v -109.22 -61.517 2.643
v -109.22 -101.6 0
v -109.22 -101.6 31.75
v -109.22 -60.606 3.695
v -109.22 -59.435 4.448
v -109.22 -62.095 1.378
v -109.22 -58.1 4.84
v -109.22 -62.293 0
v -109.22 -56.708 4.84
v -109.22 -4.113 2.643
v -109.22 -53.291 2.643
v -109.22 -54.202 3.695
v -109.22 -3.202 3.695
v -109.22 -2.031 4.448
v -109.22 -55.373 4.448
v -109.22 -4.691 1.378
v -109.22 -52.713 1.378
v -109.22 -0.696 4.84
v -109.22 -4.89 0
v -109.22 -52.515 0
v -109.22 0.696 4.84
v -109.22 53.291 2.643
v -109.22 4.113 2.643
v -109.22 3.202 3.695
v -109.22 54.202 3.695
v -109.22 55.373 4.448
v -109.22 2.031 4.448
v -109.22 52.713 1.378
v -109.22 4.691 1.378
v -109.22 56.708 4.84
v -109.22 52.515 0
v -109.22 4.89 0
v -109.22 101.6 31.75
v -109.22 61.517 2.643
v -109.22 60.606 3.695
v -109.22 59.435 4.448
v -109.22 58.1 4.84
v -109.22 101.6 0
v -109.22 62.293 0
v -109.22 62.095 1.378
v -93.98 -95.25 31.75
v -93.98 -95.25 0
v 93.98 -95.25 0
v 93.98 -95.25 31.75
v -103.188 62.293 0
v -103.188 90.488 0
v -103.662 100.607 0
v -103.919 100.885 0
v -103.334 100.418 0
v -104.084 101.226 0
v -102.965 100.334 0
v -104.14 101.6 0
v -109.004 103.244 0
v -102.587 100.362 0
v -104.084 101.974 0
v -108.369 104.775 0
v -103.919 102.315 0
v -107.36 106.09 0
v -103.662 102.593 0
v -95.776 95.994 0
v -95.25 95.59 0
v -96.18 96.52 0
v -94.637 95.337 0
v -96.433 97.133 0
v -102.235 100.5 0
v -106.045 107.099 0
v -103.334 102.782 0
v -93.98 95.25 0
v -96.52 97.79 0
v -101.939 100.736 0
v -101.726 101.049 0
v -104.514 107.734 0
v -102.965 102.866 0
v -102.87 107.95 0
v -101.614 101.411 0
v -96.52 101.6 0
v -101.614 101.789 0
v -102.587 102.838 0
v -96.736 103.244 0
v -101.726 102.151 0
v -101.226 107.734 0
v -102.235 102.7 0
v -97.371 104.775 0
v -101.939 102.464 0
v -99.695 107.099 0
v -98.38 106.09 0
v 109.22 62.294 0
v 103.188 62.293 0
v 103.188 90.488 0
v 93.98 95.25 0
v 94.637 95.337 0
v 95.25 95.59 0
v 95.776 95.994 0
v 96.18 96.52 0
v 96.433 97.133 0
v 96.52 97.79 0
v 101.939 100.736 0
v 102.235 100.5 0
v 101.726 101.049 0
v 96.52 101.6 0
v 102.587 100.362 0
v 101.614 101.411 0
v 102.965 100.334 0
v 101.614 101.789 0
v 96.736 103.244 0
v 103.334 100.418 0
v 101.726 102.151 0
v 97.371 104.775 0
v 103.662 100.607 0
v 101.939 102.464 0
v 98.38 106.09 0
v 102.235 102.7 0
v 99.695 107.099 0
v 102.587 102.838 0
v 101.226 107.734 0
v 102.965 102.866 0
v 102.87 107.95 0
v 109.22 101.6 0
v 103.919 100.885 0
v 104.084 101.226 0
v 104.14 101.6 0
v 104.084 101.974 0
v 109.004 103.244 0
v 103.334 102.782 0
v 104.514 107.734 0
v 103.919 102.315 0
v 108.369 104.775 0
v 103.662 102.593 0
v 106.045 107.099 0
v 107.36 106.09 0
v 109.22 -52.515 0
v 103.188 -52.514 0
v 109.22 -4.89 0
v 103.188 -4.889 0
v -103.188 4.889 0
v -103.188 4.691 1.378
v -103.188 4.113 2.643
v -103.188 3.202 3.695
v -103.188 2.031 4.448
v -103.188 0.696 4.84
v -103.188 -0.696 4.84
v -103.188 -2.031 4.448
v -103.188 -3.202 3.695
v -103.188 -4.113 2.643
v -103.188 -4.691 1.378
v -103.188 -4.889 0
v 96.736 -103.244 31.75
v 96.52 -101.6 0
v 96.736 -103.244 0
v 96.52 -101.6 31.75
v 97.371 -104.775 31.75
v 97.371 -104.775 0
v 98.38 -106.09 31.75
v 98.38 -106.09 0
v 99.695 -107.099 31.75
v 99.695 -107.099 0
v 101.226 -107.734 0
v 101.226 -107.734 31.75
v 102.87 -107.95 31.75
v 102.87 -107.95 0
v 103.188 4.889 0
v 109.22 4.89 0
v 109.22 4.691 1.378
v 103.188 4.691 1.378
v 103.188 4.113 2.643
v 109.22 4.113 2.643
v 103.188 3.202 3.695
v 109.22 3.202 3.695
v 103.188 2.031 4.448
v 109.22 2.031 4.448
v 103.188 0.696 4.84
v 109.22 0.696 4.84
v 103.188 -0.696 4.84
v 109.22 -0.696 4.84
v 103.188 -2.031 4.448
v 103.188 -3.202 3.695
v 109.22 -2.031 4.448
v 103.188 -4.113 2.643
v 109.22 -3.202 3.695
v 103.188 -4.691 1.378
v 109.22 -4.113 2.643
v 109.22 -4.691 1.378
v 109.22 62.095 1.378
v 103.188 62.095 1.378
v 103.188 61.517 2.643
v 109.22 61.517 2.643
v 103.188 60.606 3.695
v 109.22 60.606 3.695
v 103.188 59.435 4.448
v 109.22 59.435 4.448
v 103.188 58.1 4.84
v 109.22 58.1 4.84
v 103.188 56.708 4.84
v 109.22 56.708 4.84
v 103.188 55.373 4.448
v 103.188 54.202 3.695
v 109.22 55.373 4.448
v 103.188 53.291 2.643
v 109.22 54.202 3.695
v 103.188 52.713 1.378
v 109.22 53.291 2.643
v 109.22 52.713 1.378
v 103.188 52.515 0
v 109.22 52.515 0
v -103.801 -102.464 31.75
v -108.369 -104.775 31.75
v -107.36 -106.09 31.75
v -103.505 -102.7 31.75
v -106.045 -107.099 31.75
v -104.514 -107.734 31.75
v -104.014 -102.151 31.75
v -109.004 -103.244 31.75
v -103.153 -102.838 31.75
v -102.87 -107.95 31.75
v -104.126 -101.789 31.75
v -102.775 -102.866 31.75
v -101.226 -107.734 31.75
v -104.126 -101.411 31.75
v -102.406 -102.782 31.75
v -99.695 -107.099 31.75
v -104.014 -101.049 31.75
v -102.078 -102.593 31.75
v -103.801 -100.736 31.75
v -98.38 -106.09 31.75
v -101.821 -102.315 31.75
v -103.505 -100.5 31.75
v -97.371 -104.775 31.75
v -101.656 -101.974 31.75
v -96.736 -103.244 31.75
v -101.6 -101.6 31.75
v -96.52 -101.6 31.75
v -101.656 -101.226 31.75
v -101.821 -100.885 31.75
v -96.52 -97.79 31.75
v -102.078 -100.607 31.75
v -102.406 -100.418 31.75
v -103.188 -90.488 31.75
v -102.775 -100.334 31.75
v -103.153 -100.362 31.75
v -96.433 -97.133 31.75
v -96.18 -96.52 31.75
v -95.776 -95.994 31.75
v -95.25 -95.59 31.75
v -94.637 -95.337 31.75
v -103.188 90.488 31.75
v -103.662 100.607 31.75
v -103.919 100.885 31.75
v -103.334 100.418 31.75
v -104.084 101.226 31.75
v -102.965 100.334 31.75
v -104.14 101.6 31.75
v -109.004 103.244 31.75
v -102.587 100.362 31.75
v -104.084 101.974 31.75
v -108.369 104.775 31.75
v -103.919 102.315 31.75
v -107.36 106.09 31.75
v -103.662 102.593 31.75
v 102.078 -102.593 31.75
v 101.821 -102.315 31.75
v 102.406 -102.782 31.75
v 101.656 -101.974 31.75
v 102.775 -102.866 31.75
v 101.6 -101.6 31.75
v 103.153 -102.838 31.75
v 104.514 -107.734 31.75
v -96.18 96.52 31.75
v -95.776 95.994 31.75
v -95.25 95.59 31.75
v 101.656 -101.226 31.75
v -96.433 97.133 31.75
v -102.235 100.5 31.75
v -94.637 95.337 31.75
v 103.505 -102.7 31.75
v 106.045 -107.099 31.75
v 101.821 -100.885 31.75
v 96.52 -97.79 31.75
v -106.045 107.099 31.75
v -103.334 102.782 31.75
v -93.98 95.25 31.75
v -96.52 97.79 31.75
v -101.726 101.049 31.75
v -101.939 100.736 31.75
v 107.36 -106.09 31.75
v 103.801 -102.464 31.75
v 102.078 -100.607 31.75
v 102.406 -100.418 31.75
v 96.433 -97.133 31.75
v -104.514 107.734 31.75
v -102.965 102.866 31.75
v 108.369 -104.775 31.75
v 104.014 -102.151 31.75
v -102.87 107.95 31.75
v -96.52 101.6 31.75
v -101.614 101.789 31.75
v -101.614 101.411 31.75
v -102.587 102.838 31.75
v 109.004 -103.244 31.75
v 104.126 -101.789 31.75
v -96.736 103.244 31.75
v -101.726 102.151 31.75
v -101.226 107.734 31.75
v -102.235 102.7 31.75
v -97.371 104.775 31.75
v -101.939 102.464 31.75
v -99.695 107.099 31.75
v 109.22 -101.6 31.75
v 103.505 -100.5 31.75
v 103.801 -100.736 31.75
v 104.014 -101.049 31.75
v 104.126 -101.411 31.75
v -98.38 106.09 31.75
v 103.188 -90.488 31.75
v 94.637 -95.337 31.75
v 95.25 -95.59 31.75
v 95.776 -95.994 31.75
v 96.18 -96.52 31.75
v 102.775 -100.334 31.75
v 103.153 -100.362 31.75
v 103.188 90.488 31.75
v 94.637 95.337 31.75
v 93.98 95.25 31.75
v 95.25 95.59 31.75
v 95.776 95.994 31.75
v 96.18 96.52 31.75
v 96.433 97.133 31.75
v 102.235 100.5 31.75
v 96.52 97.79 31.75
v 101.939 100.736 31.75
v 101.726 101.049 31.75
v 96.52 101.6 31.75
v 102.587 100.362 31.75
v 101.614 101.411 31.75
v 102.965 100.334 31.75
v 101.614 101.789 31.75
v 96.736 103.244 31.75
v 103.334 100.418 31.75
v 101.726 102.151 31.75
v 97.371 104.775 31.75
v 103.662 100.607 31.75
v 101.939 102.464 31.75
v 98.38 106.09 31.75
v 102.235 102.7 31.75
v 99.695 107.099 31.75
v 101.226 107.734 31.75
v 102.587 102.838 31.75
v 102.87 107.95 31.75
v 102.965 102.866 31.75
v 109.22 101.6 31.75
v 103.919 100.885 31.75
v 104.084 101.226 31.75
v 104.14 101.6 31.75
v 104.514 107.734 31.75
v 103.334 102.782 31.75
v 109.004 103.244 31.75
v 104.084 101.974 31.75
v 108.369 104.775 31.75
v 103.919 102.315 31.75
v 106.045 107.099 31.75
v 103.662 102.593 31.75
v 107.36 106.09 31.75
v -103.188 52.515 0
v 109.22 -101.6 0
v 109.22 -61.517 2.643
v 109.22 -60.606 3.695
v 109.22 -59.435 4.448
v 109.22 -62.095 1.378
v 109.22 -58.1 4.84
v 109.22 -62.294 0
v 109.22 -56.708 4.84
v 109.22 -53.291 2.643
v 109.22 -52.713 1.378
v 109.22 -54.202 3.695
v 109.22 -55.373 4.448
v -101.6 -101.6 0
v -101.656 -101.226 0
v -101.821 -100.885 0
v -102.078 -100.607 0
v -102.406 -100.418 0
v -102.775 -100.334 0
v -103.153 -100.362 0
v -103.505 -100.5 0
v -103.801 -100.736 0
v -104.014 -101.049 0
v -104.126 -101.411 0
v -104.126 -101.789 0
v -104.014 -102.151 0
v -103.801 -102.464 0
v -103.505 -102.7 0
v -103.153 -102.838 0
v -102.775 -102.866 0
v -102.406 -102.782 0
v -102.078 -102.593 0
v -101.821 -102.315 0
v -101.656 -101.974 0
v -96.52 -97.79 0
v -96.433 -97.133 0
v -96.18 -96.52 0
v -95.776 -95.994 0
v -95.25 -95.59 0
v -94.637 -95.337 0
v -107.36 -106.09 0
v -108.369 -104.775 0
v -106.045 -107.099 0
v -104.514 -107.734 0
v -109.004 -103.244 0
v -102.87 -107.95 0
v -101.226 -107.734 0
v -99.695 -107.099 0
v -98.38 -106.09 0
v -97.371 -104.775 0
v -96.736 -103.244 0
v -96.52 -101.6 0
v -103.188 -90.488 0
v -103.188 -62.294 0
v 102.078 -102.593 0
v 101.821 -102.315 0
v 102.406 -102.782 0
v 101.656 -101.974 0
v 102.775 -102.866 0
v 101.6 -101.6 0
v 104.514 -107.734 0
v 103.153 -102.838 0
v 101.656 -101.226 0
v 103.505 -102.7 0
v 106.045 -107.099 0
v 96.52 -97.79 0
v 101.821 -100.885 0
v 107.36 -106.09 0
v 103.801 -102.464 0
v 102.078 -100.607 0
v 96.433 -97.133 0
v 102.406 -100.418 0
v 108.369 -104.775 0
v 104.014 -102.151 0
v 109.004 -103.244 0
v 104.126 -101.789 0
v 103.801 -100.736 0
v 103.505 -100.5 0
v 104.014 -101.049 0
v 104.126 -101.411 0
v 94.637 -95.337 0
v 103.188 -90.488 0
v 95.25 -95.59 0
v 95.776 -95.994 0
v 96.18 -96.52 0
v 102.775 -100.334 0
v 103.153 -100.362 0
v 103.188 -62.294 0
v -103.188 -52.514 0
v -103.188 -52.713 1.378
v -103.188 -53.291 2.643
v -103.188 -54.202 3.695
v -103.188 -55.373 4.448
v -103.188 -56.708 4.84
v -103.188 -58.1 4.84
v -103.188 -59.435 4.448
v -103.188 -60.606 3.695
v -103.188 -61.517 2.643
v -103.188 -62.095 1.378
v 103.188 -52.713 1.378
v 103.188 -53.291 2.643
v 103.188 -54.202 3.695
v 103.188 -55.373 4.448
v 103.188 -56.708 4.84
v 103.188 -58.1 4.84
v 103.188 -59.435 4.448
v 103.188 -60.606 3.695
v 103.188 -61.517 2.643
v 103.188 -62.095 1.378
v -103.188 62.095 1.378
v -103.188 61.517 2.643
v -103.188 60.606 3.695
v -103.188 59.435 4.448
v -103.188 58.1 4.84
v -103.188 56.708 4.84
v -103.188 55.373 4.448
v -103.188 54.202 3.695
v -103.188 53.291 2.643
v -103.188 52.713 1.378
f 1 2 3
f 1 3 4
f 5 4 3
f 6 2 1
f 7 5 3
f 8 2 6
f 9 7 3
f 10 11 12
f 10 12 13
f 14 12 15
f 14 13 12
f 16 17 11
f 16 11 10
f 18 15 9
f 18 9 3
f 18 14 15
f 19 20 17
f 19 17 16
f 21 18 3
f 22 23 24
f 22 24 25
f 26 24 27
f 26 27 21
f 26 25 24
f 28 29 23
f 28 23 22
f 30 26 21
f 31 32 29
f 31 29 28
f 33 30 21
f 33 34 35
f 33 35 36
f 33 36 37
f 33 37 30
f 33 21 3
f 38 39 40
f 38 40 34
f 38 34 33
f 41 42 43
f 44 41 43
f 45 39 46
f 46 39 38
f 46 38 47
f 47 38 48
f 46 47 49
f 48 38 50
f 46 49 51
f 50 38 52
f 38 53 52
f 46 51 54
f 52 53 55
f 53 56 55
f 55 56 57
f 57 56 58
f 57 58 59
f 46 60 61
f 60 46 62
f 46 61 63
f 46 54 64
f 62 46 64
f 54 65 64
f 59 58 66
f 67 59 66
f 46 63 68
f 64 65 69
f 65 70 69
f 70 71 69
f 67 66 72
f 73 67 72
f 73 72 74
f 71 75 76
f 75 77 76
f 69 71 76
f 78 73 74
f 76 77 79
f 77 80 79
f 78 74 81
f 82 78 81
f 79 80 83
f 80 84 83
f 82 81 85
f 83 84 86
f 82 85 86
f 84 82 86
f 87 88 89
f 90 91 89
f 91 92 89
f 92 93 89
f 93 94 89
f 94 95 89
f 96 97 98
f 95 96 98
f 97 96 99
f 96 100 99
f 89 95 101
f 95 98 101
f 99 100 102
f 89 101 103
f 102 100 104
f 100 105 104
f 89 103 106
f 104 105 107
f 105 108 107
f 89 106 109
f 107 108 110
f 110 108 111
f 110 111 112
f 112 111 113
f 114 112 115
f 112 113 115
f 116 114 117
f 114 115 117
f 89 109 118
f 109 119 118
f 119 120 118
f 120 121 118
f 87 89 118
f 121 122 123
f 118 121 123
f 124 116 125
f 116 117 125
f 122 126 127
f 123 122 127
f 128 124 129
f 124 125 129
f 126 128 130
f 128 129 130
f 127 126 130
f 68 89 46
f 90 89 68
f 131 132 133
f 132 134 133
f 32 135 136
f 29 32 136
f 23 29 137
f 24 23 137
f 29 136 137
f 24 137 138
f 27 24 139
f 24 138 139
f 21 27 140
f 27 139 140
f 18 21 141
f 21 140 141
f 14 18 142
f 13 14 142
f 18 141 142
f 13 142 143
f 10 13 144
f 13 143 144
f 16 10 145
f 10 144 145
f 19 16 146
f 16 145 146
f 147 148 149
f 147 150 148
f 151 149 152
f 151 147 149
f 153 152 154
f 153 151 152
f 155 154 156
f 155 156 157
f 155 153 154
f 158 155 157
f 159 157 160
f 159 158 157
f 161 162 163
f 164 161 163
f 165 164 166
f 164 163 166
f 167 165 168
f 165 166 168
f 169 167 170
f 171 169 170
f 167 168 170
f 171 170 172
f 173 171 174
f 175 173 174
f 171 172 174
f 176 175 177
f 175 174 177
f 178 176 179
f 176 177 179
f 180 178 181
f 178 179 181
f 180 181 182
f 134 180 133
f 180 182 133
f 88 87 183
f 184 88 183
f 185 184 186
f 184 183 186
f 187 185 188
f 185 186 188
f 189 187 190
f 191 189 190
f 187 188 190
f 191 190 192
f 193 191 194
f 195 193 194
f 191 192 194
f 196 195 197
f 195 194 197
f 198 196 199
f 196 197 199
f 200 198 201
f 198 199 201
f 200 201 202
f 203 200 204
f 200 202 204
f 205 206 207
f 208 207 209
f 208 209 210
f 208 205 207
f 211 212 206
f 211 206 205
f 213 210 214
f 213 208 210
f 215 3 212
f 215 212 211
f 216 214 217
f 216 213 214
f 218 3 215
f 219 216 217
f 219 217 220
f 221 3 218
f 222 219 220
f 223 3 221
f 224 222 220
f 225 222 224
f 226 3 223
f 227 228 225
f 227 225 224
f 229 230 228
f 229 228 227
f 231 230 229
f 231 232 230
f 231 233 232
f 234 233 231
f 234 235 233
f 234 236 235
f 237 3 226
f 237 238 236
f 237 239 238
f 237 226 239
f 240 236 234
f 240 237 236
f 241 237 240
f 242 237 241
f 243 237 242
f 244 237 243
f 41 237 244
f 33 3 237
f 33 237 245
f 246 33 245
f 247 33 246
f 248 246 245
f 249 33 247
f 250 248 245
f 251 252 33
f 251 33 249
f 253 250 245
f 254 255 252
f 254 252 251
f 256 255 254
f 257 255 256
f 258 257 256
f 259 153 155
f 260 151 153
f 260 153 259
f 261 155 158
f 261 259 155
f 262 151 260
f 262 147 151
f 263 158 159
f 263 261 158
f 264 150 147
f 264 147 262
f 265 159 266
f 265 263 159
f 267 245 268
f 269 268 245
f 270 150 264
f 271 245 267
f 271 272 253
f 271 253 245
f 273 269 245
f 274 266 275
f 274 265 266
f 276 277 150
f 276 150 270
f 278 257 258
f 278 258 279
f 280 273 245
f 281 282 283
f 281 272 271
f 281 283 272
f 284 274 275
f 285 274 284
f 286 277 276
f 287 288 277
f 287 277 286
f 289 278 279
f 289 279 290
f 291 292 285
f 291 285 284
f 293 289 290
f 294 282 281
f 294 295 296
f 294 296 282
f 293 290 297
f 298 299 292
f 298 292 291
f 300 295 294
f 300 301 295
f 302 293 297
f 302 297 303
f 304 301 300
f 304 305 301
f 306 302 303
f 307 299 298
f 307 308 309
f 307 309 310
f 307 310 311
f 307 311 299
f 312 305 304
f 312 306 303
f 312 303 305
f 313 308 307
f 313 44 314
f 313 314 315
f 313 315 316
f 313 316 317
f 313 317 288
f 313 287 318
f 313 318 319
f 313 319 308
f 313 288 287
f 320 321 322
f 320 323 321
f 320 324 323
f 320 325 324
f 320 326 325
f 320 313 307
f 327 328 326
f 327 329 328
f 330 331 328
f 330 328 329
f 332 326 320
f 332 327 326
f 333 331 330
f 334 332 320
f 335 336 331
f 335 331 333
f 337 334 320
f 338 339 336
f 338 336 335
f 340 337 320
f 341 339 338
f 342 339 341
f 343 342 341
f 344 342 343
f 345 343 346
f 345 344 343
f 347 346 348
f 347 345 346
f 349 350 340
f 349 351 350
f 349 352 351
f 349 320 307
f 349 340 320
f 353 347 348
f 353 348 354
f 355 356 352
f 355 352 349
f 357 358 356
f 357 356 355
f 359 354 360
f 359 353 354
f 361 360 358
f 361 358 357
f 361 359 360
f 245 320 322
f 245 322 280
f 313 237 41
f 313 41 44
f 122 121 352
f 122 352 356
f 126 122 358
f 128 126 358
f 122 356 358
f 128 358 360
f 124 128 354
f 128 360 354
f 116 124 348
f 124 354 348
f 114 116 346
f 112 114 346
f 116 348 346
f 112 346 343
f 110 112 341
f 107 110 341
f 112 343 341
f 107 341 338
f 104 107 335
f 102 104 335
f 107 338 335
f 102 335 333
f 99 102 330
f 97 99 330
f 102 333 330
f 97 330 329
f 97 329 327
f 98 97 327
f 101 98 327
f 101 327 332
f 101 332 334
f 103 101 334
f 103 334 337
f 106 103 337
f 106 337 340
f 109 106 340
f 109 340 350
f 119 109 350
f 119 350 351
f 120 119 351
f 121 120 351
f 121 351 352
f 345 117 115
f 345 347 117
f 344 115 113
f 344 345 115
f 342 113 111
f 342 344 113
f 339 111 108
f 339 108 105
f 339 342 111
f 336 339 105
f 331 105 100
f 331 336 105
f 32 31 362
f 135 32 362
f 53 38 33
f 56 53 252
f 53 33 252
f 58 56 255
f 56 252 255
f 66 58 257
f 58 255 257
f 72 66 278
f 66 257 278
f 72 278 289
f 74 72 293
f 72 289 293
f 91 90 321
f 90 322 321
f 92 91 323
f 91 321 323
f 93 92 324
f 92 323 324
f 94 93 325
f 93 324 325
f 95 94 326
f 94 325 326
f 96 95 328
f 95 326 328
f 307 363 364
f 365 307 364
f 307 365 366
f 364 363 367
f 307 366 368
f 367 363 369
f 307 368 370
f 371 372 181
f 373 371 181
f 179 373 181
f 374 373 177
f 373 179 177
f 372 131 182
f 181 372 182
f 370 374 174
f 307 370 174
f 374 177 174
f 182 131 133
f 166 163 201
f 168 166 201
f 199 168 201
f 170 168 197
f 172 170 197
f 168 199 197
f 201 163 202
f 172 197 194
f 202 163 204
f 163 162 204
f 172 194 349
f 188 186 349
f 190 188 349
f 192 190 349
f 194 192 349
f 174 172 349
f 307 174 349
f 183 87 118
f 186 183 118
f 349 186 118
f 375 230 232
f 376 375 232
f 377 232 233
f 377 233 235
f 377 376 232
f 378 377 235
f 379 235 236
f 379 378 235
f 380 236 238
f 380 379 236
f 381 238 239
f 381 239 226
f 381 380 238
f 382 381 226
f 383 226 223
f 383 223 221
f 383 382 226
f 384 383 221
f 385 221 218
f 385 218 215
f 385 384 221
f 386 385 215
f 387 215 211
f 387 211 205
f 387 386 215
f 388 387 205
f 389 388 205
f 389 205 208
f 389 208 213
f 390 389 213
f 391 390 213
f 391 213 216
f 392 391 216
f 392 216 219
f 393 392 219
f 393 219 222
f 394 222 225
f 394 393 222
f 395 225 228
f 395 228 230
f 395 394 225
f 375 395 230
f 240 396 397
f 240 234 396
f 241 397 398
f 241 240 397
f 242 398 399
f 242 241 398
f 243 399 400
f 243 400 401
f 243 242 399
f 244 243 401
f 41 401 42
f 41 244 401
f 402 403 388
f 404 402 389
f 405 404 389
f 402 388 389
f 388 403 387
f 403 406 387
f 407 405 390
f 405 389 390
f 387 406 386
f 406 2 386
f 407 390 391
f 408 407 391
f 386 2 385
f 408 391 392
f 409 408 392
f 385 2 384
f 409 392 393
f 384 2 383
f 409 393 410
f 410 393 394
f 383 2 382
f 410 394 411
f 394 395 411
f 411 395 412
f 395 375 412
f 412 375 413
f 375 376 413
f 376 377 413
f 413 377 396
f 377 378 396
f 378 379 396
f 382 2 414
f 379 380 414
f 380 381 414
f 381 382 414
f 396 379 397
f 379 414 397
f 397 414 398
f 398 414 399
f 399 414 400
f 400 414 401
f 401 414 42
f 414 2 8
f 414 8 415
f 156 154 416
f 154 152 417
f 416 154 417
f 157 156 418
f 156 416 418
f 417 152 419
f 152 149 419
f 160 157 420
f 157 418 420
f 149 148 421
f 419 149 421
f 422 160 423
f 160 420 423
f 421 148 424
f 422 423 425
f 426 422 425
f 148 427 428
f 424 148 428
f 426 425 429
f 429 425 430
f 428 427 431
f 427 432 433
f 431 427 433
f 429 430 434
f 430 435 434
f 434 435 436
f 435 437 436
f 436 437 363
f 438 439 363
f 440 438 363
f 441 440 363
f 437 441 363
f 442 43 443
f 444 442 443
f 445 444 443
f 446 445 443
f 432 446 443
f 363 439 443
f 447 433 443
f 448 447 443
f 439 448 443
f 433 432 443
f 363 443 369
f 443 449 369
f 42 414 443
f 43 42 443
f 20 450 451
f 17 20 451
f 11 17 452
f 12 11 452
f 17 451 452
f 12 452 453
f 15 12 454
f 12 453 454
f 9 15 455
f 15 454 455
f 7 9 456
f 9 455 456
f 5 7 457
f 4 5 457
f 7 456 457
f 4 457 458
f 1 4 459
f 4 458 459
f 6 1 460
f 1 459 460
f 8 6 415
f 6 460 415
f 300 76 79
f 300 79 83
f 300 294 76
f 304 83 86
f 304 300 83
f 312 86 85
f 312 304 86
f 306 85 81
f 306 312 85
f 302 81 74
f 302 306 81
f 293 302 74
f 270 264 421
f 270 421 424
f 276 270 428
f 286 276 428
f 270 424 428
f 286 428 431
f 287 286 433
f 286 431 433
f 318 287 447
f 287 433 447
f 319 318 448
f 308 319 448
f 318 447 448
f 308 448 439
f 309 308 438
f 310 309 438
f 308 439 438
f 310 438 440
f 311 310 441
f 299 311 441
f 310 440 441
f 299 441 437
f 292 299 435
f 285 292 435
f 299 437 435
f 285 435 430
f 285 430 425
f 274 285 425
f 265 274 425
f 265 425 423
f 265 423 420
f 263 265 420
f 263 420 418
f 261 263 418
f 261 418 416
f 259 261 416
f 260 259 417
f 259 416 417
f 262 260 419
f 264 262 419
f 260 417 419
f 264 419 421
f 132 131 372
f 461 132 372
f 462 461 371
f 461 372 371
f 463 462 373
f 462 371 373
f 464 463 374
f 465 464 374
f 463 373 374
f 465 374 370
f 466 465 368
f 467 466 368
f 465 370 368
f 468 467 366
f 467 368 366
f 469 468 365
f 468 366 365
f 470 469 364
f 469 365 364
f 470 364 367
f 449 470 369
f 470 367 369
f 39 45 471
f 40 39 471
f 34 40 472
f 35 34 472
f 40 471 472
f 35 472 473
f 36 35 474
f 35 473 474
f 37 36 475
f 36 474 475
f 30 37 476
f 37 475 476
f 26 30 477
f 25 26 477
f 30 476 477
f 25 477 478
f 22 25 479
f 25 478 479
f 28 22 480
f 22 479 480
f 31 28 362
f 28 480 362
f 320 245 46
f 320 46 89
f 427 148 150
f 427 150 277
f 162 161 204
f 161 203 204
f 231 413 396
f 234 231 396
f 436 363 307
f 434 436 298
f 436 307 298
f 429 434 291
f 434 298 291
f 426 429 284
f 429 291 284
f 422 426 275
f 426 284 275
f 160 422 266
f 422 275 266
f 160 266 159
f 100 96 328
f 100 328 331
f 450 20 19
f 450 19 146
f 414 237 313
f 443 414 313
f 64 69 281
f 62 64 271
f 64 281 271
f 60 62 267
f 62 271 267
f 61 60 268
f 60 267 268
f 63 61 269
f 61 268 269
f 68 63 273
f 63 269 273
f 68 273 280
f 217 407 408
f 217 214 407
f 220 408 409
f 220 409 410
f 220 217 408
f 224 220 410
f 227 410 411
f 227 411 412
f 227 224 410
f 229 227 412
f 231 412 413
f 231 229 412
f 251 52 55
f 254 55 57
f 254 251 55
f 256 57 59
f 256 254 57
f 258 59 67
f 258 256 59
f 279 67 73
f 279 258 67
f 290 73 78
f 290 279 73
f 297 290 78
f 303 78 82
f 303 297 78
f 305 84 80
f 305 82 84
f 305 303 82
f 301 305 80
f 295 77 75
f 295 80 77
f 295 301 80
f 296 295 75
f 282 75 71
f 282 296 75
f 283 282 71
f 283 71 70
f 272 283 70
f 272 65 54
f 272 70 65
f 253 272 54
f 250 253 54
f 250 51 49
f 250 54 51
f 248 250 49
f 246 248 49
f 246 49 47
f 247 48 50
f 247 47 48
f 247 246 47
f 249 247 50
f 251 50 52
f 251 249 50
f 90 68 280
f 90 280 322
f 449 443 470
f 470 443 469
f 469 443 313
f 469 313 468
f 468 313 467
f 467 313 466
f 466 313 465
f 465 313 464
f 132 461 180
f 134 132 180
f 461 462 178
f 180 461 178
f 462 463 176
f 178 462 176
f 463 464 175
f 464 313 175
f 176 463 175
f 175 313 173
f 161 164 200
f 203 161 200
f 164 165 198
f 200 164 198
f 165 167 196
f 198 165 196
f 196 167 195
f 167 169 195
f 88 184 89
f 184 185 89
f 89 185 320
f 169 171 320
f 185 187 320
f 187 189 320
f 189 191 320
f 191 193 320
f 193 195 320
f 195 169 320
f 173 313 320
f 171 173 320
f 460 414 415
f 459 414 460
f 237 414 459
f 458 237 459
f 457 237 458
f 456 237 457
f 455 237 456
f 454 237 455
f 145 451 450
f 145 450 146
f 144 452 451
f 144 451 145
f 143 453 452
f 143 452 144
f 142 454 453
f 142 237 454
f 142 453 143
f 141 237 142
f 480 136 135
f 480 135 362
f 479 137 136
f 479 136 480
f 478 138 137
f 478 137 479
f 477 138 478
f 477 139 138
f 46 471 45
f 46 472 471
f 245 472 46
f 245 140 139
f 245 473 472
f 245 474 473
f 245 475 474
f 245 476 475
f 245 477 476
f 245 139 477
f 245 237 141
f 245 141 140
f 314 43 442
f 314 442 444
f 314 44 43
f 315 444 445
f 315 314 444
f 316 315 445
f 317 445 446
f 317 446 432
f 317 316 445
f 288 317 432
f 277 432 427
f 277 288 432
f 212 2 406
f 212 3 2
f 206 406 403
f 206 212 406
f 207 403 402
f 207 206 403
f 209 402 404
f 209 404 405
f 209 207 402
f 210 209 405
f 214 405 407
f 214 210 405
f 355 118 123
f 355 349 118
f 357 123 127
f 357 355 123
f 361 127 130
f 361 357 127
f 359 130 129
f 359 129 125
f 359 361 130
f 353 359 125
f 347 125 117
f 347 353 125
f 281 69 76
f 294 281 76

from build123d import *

# Parameters (mm, degrees)
SKETCH1_W            = 218.44
SKETCH1_H            = 190.5
BOSS_EXTRUDE1_DEPTH  = 31.75
SKETCH2_W            = 206.375
SKETCH2_H            = 180.975
CUT_EXTRUDE1_DEPTH   = 149.356440373
SKETCH3_R            = 4.8895
CUT_EXTRUDE2_DEPTH   = 241.409356307
SKETCH4_W            = 12.7
SKETCH4_H            = 12.7
BOSS_EXTRUDE2_DEPTH  = 31.75
SKETCH5_R            = 1.27
CUT_EXTRUDE3_DEPTH   = 157.81286108
FILLET1_R            = 6.35
SKETCH6_W            = 12.7
SKETCH6_H            = 12.7
SKETCH6_R            = 1.27
BOSS_EXTRUDE3_DEPTH  = 31.75
FILLET4_R            = 6.35
FILLET1_OF_MIRROR8_R = 6.35
FILLET4_OF_MIRROR8_R = 6.35
FILLET5_R            = 2.54


with BuildPart() as part:
    # Sketch1 → Boss-Extrude1 (new body)
    with BuildSketch(Plane.XY):
        Rectangle(SKETCH1_W, SKETCH1_H)
    extrude(amount=BOSS_EXTRUDE1_DEPTH)

    # Sketch2 → Cut-Extrude1 (cut, through all)
    with BuildSketch(Plane.XY.offset(31.75)):
        Rectangle(SKETCH2_W, SKETCH2_H)
    extrude(amount=-CUT_EXTRUDE1_DEPTH, mode=Mode.SUBTRACT)

    # Sketch3 → Cut-Extrude2 (cut, through all)
    with BuildSketch(Plane(origin=(109.22, 0, 0), x_dir=(0, 0, -1), z_dir=(1, 0, 0))):
        Circle(SKETCH3_R)
        with Locations((0, 57.404)):
            Circle(SKETCH3_R)
        with Locations((0, -57.404)):
            Circle(SKETCH3_R)
    extrude(amount=-CUT_EXTRUDE2_DEPTH, mode=Mode.SUBTRACT)

    # Sketch4 → Boss-Extrude2 (add, through all)
    with BuildSketch(Plane(origin=(0, 0, 0), x_dir=(-1, 0, 0), z_dir=(0, 0, -1))):
        with Locations((-102.87, 101.6)):
            Rectangle(SKETCH4_W, SKETCH4_H)
    boss_extrude2 = extrude(amount=-BOSS_EXTRUDE2_DEPTH)

    # Sketch5 → Cut-Extrude3 (cut, through all)
    with BuildSketch(Plane.XY.offset(31.75)):
        with Locations((102.87, 101.6)):
            Circle(SKETCH5_R)
    cut_extrude3 = extrude(amount=-CUT_EXTRUDE3_DEPTH, mode=Mode.SUBTRACT)

    # Fillet1
    fillet1_edges = [part.edges().sort_by_distance(p)[0] for p in [
        (96.52, 107.95, 15.875),
        (109.22, 107.95, 15.875),
    ]]
    fillet(fillet1_edges, radius=FILLET1_R - 0.0001)  # a hair under: the kernel refuses the full size

    # Sketch6 → Boss-Extrude3 (add, through all)
    with BuildSketch(Plane(origin=(0, 0, 0), x_dir=(-1, 0, 0), z_dir=(0, 0, -1))):
        with Locations((-102.87, -101.6)):
            Rectangle(SKETCH6_W, SKETCH6_H)
        with Locations((-102.87, -101.6)):
            Circle(SKETCH6_R, mode=Mode.SUBTRACT)
    boss_extrude3 = extrude(amount=-BOSS_EXTRUDE3_DEPTH)

    # Fillet4
    fillet4_edges = [part.edges().sort_by_distance(p)[0] for p in [
        (109.22, -107.95, 15.875),
        (96.52, -107.95, 15.875),
    ]]
    fillet(fillet4_edges, radius=FILLET4_R - 0.0001)  # a hair under: the kernel refuses the full size

    # Mirror8: Boss-Extrude2, Cut-Extrude3, Boss-Extrude3 across plane
    add(boss_extrude2.mirror(Plane(origin=(0, 0, 0), x_dir=(0, 0, 1), z_dir=(1, 0, 0))))
    add(cut_extrude3.mirror(Plane(origin=(0, 0, 0), x_dir=(0, 0, 1), z_dir=(1, 0, 0))), mode=Mode.SUBTRACT)
    add(boss_extrude3.mirror(Plane(origin=(0, 0, 0), x_dir=(0, 0, 1), z_dir=(1, 0, 0))))

    # Fillet1 of Mirror8
    fillet1_of_mirror8_edges = [part.edges().sort_by_distance(p)[0] for p in [
        (-96.52, 107.95, 15.875),
        (-109.22, 107.95, 15.875),
    ]]
    fillet(fillet1_of_mirror8_edges, radius=FILLET1_OF_MIRROR8_R - 0.0001)  # a hair under: the kernel refuses the full size

    # Fillet4 of Mirror8
    fillet4_of_mirror8_edges = [part.edges().sort_by_distance(p)[0] for p in [
        (-109.22, -107.95, 15.875),
        (-96.52, -107.95, 15.875),
    ]]
    fillet(fillet4_of_mirror8_edges, radius=FILLET4_OF_MIRROR8_R - 0.0001)  # a hair under: the kernel refuses the full size

    # Fillet5
    fillet5_edges = [part.edges().sort_by_distance(p)[0] for p in [
        (96.52, -95.25, 15.875),
        (-96.52, 95.25, 15.875),
        (-96.52, -95.25, 15.875),
        (96.52, 95.25, 15.875),
    ]]
    fillet(fillet5_edges, radius=FILLET5_R)


solid = part.part
